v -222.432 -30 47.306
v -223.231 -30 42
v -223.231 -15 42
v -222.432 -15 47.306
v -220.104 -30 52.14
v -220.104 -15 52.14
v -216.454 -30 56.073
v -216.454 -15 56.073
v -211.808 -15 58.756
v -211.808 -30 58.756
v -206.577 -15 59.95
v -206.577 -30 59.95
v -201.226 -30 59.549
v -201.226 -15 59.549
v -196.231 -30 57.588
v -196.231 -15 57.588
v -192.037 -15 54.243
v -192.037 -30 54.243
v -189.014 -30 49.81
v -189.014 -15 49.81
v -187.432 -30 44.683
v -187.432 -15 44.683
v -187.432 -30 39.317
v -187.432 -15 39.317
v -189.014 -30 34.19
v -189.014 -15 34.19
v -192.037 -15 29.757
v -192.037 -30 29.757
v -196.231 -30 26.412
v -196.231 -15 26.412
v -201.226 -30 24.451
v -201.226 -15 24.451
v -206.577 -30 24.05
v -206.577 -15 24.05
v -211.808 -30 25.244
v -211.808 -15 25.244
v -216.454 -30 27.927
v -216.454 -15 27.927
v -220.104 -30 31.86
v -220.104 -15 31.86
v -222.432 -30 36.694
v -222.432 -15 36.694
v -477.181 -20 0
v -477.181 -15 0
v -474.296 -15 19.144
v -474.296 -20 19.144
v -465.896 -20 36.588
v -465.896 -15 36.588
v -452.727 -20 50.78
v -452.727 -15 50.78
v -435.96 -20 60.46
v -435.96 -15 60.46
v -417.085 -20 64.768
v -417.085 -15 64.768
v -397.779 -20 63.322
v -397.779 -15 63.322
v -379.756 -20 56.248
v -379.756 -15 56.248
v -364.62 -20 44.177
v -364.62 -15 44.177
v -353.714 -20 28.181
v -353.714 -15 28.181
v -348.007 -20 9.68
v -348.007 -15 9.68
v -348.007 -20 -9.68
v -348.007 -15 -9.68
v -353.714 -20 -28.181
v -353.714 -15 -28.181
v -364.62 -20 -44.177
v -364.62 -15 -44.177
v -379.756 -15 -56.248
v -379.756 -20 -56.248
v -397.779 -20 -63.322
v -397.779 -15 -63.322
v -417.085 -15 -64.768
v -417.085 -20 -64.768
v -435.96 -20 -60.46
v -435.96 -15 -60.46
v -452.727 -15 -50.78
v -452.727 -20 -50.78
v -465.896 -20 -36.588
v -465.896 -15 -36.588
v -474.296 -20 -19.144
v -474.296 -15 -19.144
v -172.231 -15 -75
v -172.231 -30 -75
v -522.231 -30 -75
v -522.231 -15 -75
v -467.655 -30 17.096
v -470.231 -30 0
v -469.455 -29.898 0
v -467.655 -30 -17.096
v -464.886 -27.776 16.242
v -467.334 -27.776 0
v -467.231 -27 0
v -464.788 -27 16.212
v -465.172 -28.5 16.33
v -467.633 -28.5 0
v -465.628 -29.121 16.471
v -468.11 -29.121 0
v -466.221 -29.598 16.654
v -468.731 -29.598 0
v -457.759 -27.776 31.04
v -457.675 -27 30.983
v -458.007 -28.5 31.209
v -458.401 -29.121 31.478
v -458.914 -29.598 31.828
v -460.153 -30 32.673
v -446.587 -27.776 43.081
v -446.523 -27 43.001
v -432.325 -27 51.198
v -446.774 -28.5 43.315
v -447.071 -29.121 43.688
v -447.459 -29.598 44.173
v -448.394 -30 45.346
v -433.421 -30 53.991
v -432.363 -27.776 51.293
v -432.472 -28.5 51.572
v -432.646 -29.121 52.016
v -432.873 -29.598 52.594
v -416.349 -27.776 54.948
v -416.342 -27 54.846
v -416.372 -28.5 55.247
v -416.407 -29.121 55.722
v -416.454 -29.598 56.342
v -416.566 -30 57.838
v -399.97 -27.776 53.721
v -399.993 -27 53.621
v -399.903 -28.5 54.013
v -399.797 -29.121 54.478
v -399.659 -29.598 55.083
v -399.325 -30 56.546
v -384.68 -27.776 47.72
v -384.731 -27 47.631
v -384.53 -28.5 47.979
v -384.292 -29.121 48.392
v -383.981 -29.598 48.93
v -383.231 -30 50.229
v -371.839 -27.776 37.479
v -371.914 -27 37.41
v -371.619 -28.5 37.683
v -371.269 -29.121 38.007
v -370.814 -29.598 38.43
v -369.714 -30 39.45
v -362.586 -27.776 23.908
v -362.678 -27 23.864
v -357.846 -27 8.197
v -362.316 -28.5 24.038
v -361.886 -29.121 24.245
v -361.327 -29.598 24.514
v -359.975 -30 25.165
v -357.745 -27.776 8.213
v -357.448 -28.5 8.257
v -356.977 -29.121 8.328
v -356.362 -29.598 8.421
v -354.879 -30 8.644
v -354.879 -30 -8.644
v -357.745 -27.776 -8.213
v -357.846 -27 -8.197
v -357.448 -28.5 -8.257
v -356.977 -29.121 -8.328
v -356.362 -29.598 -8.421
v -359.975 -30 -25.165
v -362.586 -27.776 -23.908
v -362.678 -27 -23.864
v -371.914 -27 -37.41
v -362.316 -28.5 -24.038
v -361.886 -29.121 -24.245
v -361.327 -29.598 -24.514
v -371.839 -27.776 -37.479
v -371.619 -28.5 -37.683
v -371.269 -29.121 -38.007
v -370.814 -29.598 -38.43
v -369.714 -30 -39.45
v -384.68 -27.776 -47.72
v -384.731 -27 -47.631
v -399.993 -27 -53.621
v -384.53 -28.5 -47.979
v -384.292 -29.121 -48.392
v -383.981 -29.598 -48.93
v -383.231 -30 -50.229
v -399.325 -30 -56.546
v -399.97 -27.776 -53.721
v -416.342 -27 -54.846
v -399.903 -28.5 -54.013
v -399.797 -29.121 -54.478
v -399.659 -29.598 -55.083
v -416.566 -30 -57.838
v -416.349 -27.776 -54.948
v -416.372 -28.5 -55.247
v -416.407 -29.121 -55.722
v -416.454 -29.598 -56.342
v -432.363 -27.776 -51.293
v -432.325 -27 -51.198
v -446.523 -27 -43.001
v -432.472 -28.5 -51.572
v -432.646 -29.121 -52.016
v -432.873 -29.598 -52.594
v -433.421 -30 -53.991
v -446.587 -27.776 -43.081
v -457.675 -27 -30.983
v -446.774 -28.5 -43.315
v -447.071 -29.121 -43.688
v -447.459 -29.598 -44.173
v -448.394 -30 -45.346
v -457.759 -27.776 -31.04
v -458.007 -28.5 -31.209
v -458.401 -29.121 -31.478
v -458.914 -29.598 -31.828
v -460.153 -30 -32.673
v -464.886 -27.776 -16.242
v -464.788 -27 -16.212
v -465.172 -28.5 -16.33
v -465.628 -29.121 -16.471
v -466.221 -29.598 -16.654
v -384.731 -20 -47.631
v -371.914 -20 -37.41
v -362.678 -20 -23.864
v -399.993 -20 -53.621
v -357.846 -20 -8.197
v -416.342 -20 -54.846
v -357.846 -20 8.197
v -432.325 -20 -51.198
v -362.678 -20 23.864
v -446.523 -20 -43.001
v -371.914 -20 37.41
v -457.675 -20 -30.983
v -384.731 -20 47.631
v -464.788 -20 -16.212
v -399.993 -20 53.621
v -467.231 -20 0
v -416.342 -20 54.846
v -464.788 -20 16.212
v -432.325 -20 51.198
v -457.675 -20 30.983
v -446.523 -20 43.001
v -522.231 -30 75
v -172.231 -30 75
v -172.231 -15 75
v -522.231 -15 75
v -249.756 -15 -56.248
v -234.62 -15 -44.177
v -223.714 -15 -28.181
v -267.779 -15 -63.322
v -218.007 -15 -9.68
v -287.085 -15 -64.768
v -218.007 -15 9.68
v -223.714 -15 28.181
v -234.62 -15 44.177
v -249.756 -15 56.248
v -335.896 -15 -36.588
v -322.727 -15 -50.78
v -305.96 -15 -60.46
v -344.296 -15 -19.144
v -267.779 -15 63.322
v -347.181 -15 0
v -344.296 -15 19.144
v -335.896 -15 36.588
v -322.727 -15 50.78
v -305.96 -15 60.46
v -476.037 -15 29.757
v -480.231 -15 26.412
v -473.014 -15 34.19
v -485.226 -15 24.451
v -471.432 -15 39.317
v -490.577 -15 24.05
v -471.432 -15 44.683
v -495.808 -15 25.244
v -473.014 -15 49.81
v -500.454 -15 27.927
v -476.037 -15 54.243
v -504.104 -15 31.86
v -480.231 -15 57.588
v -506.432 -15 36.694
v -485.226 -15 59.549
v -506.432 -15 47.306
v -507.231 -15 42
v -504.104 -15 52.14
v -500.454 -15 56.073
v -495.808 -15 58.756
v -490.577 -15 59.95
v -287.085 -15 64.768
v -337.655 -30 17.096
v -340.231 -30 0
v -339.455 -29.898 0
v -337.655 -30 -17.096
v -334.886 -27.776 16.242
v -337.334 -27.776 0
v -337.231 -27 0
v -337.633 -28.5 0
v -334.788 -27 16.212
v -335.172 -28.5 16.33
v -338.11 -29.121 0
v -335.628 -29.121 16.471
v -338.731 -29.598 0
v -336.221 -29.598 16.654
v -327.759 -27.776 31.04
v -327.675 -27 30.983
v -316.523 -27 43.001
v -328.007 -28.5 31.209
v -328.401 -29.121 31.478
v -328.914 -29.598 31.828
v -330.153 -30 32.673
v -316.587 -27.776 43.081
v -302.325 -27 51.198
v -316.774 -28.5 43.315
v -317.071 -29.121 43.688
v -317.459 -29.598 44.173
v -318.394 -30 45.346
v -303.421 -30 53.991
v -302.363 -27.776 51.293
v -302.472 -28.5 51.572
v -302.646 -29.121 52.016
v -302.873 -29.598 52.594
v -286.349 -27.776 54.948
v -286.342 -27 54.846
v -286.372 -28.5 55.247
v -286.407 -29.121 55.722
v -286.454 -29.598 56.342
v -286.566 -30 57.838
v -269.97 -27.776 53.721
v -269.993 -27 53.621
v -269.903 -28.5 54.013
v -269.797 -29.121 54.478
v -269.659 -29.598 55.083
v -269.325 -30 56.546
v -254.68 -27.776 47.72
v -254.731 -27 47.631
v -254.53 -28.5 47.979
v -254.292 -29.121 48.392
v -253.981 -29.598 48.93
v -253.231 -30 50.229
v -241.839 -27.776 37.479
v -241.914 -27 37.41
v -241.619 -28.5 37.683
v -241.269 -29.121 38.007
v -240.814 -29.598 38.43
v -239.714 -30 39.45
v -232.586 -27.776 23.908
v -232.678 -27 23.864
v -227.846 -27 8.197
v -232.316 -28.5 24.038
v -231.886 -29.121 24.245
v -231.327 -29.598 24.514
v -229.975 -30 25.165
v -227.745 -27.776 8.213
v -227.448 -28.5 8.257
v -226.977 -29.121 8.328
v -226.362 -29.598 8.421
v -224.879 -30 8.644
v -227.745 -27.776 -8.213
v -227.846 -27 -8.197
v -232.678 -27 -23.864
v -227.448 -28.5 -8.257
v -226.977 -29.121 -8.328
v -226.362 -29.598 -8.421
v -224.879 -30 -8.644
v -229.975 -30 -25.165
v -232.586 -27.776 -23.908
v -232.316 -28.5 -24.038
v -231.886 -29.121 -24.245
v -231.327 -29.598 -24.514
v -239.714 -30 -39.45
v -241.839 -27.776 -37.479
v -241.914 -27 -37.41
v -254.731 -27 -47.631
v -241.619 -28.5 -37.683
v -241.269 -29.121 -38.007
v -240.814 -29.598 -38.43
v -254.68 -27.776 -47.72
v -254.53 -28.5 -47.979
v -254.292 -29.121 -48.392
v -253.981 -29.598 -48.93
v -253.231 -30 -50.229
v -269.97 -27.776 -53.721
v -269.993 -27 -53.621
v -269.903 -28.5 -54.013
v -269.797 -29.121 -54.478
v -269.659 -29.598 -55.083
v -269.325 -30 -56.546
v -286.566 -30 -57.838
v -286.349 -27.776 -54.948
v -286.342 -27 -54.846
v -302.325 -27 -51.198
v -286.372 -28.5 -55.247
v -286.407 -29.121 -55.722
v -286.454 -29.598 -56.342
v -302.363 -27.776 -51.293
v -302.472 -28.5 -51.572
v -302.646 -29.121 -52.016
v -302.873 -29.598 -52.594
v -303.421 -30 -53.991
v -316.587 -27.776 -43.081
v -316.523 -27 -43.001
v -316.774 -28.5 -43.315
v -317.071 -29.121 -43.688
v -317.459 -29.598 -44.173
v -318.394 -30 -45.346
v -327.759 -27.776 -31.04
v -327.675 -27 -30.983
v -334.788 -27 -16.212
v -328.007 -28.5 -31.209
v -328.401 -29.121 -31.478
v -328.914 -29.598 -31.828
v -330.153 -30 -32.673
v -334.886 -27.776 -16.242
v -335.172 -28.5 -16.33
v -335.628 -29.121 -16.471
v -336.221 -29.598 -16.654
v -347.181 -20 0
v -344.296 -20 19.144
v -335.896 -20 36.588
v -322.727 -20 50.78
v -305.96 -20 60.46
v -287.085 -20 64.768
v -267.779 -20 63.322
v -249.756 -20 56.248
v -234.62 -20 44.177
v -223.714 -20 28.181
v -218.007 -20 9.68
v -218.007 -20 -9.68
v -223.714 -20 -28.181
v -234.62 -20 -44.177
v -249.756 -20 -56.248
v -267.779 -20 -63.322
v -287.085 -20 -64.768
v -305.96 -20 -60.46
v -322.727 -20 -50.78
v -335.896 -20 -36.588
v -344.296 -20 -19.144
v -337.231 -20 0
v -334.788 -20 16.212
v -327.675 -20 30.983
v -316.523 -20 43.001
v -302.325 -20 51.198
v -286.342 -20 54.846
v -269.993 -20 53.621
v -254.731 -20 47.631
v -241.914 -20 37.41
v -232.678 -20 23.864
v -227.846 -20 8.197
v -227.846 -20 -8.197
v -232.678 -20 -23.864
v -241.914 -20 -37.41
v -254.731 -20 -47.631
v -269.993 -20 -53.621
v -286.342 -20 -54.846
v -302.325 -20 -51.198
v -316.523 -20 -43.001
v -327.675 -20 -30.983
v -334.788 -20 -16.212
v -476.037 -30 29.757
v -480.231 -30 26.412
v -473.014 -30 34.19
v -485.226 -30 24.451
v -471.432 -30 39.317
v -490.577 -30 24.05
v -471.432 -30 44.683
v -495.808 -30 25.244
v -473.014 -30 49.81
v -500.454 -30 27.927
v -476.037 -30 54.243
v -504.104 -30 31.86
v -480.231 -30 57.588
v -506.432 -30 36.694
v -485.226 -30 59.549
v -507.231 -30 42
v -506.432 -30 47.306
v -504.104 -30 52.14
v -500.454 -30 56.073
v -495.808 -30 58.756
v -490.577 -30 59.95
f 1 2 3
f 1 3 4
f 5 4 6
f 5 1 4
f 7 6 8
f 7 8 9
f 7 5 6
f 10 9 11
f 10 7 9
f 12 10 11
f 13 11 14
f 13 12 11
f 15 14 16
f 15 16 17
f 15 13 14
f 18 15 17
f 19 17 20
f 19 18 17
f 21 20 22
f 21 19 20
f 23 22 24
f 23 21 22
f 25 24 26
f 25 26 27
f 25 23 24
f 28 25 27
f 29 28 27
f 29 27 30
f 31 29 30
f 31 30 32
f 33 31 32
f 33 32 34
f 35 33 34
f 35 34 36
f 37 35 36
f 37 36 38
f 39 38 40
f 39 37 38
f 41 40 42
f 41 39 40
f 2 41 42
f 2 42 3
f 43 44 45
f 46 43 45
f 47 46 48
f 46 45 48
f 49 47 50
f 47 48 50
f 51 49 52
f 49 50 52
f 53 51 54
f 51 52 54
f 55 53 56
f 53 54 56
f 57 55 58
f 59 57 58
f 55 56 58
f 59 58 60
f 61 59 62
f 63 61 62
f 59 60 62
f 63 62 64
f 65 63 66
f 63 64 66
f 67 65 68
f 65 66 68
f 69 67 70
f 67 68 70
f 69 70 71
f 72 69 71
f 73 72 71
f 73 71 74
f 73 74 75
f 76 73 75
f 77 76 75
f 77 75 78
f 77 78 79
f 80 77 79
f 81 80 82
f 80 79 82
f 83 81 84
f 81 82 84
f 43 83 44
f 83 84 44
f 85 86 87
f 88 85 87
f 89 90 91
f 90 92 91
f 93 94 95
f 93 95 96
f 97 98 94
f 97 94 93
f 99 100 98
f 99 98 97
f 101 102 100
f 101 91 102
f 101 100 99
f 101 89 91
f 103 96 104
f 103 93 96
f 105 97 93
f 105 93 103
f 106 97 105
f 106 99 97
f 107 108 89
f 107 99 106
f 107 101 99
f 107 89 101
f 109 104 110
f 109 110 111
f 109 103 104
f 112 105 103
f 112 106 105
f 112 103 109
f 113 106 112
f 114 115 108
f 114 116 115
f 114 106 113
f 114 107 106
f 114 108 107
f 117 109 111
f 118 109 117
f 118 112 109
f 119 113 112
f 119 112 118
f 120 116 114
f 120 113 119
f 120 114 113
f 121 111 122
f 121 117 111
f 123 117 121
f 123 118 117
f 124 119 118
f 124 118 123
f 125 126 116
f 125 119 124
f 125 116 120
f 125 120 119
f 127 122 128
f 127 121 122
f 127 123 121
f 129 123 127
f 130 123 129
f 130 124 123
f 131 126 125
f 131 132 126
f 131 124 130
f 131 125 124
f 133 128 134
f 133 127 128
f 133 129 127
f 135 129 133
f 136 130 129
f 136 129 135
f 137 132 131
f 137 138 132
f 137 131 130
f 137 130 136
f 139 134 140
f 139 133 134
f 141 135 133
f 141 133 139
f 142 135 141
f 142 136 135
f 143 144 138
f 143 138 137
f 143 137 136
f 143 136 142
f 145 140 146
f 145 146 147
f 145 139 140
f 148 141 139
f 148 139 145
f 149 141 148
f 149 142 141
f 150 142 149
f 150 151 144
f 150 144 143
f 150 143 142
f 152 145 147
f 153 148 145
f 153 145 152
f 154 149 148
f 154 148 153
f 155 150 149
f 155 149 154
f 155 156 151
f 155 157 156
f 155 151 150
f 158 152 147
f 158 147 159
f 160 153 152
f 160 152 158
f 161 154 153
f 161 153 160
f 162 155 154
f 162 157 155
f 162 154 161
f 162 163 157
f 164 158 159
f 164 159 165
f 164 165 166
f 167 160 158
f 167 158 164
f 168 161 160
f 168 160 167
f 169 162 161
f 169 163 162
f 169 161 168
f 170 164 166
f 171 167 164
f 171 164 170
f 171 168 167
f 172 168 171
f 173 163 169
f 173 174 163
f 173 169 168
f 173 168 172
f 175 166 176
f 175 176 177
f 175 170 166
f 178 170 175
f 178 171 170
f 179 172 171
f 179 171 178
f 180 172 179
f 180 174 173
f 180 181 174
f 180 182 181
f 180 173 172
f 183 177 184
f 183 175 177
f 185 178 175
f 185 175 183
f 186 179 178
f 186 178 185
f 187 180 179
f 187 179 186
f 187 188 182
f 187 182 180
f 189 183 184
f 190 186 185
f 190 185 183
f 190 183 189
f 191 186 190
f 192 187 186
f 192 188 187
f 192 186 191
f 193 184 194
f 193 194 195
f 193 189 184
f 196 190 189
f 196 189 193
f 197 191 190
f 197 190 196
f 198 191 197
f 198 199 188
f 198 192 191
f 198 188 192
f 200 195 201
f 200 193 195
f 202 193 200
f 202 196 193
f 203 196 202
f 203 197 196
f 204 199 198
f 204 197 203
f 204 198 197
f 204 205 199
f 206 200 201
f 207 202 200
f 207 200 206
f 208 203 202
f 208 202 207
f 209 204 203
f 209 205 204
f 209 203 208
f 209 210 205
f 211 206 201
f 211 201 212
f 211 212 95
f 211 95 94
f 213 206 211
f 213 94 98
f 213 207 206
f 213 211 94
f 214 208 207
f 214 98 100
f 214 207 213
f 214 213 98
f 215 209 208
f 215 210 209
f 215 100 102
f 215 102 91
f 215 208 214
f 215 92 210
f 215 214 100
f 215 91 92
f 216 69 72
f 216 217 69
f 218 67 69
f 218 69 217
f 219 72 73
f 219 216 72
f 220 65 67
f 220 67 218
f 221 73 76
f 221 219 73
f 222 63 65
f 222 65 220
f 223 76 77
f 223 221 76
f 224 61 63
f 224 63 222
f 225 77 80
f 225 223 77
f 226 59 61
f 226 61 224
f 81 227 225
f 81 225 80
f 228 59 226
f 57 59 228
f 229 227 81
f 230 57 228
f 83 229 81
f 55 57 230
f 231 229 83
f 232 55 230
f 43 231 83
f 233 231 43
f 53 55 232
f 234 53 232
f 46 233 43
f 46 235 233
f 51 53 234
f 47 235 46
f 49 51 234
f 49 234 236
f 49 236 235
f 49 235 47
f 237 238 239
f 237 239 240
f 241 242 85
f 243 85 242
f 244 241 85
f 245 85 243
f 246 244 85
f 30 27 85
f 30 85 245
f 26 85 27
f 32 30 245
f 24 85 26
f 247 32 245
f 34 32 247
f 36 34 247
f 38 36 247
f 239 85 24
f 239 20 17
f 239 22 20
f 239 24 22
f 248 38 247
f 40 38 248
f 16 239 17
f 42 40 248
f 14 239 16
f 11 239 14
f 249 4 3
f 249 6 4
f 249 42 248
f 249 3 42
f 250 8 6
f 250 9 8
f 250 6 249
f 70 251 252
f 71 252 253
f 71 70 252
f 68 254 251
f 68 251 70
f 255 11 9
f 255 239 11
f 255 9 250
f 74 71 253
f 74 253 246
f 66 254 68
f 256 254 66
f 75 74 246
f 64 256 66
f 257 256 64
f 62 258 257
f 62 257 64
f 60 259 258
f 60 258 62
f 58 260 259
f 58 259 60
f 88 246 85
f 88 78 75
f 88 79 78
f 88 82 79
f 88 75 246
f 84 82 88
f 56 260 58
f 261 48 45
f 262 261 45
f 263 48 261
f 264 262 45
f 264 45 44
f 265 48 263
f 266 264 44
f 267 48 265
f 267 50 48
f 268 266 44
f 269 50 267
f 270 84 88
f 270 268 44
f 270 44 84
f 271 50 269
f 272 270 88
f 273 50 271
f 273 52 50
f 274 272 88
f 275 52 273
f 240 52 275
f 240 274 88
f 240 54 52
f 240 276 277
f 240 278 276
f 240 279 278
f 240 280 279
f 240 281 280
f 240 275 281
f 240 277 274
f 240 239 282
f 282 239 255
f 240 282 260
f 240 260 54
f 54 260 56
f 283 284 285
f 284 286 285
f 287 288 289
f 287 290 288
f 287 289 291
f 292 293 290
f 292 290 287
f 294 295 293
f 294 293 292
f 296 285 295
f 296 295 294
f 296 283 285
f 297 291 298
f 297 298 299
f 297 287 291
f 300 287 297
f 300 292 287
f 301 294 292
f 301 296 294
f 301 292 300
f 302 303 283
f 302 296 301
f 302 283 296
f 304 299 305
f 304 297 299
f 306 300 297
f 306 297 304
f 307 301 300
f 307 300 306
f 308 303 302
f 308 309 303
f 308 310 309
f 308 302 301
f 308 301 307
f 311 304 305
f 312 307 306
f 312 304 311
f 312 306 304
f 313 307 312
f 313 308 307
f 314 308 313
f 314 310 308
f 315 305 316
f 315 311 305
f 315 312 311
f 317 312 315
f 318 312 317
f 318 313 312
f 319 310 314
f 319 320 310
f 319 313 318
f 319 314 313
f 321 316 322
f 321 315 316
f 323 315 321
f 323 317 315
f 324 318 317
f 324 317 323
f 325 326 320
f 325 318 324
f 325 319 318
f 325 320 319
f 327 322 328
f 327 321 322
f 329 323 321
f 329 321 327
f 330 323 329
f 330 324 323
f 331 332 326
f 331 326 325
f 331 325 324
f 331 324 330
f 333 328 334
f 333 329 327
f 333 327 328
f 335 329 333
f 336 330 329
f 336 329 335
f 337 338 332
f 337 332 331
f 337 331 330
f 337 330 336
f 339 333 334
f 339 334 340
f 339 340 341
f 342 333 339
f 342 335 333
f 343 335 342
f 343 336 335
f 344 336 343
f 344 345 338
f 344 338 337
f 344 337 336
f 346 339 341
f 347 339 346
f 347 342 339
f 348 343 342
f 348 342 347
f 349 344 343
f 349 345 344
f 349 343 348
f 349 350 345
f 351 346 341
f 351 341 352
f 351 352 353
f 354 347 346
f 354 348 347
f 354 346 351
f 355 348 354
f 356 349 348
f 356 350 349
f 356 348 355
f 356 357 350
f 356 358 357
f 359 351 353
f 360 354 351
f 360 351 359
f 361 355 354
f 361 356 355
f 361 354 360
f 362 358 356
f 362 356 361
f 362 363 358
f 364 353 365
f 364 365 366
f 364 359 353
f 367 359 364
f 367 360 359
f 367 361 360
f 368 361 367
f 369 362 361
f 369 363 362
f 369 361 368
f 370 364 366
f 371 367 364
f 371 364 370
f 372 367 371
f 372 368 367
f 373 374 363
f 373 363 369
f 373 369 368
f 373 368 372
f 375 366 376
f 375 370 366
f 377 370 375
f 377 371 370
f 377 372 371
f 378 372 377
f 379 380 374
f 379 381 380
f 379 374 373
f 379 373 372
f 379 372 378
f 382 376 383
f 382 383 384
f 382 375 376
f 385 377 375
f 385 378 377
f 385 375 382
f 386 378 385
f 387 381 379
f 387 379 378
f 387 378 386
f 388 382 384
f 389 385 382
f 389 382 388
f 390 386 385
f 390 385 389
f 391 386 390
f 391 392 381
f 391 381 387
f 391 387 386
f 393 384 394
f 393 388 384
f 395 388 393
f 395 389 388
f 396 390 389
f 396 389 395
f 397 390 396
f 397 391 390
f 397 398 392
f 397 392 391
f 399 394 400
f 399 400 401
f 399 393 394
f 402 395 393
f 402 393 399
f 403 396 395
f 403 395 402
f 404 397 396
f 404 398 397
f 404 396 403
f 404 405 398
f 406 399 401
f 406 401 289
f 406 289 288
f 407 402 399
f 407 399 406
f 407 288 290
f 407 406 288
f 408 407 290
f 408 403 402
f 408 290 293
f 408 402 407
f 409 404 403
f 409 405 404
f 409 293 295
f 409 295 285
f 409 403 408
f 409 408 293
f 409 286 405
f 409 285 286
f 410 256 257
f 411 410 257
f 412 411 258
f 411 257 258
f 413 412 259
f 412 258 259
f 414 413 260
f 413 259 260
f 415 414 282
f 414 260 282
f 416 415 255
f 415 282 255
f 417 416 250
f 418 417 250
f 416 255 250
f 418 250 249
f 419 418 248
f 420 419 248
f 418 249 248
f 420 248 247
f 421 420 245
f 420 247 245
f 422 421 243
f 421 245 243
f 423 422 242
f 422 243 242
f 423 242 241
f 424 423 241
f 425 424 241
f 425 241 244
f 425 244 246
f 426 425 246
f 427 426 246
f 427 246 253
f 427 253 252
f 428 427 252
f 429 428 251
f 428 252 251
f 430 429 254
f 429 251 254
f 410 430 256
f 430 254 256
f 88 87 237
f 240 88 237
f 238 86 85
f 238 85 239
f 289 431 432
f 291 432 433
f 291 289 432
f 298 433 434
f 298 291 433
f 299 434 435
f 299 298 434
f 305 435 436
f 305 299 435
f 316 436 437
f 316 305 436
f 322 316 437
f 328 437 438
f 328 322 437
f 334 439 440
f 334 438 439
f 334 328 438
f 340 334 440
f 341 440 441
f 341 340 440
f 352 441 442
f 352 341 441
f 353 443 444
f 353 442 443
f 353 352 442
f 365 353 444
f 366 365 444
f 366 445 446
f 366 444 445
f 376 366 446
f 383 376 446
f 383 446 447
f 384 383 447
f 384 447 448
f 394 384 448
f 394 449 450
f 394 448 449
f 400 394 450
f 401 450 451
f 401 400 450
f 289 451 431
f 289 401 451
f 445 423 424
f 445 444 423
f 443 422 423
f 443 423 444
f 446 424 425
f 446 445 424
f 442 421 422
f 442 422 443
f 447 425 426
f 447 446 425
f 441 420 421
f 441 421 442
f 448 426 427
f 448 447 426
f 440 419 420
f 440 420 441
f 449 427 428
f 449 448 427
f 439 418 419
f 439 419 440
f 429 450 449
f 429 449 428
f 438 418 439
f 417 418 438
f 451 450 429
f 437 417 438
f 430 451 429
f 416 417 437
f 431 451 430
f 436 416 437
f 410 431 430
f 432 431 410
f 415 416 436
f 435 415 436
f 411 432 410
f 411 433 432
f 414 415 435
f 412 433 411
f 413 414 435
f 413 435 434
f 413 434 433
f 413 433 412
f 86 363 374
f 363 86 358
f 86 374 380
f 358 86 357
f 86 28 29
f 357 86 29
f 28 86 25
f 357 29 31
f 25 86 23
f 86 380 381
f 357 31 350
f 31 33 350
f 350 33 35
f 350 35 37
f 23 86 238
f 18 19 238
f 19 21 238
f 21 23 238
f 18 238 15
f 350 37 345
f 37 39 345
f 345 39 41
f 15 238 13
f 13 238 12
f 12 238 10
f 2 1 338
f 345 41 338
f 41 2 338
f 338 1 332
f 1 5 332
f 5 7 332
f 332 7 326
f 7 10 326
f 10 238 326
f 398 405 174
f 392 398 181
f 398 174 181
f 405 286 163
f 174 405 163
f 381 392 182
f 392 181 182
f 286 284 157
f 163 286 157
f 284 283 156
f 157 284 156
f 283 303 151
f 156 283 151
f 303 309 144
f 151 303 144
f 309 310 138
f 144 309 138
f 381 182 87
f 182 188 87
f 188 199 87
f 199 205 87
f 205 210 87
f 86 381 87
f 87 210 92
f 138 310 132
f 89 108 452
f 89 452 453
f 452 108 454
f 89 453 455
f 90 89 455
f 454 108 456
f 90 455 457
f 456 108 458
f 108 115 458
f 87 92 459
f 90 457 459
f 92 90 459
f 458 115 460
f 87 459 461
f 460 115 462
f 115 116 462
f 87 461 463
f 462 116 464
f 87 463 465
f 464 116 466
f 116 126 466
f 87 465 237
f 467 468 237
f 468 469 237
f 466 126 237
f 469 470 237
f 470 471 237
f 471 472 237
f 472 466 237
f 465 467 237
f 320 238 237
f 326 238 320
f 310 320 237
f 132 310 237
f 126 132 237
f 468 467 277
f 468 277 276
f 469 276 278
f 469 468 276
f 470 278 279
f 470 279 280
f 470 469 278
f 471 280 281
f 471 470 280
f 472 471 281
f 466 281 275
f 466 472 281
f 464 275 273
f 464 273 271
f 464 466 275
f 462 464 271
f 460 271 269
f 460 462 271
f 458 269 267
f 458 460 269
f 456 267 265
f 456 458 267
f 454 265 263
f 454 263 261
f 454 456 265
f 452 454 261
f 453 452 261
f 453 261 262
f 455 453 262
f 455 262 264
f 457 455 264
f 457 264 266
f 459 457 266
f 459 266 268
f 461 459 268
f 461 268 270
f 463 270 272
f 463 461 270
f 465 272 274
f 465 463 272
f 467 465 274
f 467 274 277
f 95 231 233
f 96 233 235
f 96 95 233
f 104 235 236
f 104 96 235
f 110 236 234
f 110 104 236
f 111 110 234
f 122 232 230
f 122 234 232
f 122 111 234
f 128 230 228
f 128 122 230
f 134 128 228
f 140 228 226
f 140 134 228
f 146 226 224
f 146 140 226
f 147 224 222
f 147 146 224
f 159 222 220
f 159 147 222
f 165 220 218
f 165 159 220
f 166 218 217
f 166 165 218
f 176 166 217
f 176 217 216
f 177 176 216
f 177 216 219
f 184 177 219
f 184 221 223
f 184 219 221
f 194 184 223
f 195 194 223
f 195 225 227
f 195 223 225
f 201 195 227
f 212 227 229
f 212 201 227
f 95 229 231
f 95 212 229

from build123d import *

# Parameters (mm, degrees)
F0_W     = 350
F0_H     = 150
F0_R     = 55
F0_R_2   = 18
F1_DEPTH = 15
F2_R     = 3
F3_ANGLE = 180
F4_R     = 64.95
F5_DEPTH = 5


with BuildPart() as f1:
    # F0 (on Front) → F1 (new body)
    with BuildSketch(Plane.XZ):
        with Locations((2.768559, 0)):
            Rectangle(F0_W, F0_H)
        with Locations((-62.231441, 0)):
            Circle(F0_R, mode=Mode.SUBTRACT)
        with Locations((-139.231441, 42)):
            Circle(F0_R_2, mode=Mode.SUBTRACT)
        with Locations((67.768559, 0)):
            Circle(F0_R, mode=Mode.SUBTRACT)
        with Locations((144.768559, 42)):
            Circle(F0_R_2, mode=Mode.SUBTRACT)
    extrude(amount=F1_DEPTH)

    # F2
    f2_edges = [f1.edges().sort_by_distance(p)[0] for p in [
        (-117.231441, 0, 0),
        (12.768559, 0, 0),
    ]]
    fillet(f2_edges, radius=F2_R)


with BuildPart() as f1_1:
    # F3: moved
    add(f1.part.rotate(Axis((-172.231441, -15, 0), (0, 0, 1)), F3_ANGLE))

    # F4 (on face) → F5 (cut)
    with BuildSketch(Plane(origin=(0, -15, 0), x_dir=(-1, 0, 0), z_dir=(0, 1, 0))):
        with Locations((282.231441, 0)):
            Circle(F4_R)
        with Locations((412.231441, 0)):
            Circle(F4_R)
    extrude(amount=-F5_DEPTH, mode=Mode.SUBTRACT)


solid = f1_1.part
